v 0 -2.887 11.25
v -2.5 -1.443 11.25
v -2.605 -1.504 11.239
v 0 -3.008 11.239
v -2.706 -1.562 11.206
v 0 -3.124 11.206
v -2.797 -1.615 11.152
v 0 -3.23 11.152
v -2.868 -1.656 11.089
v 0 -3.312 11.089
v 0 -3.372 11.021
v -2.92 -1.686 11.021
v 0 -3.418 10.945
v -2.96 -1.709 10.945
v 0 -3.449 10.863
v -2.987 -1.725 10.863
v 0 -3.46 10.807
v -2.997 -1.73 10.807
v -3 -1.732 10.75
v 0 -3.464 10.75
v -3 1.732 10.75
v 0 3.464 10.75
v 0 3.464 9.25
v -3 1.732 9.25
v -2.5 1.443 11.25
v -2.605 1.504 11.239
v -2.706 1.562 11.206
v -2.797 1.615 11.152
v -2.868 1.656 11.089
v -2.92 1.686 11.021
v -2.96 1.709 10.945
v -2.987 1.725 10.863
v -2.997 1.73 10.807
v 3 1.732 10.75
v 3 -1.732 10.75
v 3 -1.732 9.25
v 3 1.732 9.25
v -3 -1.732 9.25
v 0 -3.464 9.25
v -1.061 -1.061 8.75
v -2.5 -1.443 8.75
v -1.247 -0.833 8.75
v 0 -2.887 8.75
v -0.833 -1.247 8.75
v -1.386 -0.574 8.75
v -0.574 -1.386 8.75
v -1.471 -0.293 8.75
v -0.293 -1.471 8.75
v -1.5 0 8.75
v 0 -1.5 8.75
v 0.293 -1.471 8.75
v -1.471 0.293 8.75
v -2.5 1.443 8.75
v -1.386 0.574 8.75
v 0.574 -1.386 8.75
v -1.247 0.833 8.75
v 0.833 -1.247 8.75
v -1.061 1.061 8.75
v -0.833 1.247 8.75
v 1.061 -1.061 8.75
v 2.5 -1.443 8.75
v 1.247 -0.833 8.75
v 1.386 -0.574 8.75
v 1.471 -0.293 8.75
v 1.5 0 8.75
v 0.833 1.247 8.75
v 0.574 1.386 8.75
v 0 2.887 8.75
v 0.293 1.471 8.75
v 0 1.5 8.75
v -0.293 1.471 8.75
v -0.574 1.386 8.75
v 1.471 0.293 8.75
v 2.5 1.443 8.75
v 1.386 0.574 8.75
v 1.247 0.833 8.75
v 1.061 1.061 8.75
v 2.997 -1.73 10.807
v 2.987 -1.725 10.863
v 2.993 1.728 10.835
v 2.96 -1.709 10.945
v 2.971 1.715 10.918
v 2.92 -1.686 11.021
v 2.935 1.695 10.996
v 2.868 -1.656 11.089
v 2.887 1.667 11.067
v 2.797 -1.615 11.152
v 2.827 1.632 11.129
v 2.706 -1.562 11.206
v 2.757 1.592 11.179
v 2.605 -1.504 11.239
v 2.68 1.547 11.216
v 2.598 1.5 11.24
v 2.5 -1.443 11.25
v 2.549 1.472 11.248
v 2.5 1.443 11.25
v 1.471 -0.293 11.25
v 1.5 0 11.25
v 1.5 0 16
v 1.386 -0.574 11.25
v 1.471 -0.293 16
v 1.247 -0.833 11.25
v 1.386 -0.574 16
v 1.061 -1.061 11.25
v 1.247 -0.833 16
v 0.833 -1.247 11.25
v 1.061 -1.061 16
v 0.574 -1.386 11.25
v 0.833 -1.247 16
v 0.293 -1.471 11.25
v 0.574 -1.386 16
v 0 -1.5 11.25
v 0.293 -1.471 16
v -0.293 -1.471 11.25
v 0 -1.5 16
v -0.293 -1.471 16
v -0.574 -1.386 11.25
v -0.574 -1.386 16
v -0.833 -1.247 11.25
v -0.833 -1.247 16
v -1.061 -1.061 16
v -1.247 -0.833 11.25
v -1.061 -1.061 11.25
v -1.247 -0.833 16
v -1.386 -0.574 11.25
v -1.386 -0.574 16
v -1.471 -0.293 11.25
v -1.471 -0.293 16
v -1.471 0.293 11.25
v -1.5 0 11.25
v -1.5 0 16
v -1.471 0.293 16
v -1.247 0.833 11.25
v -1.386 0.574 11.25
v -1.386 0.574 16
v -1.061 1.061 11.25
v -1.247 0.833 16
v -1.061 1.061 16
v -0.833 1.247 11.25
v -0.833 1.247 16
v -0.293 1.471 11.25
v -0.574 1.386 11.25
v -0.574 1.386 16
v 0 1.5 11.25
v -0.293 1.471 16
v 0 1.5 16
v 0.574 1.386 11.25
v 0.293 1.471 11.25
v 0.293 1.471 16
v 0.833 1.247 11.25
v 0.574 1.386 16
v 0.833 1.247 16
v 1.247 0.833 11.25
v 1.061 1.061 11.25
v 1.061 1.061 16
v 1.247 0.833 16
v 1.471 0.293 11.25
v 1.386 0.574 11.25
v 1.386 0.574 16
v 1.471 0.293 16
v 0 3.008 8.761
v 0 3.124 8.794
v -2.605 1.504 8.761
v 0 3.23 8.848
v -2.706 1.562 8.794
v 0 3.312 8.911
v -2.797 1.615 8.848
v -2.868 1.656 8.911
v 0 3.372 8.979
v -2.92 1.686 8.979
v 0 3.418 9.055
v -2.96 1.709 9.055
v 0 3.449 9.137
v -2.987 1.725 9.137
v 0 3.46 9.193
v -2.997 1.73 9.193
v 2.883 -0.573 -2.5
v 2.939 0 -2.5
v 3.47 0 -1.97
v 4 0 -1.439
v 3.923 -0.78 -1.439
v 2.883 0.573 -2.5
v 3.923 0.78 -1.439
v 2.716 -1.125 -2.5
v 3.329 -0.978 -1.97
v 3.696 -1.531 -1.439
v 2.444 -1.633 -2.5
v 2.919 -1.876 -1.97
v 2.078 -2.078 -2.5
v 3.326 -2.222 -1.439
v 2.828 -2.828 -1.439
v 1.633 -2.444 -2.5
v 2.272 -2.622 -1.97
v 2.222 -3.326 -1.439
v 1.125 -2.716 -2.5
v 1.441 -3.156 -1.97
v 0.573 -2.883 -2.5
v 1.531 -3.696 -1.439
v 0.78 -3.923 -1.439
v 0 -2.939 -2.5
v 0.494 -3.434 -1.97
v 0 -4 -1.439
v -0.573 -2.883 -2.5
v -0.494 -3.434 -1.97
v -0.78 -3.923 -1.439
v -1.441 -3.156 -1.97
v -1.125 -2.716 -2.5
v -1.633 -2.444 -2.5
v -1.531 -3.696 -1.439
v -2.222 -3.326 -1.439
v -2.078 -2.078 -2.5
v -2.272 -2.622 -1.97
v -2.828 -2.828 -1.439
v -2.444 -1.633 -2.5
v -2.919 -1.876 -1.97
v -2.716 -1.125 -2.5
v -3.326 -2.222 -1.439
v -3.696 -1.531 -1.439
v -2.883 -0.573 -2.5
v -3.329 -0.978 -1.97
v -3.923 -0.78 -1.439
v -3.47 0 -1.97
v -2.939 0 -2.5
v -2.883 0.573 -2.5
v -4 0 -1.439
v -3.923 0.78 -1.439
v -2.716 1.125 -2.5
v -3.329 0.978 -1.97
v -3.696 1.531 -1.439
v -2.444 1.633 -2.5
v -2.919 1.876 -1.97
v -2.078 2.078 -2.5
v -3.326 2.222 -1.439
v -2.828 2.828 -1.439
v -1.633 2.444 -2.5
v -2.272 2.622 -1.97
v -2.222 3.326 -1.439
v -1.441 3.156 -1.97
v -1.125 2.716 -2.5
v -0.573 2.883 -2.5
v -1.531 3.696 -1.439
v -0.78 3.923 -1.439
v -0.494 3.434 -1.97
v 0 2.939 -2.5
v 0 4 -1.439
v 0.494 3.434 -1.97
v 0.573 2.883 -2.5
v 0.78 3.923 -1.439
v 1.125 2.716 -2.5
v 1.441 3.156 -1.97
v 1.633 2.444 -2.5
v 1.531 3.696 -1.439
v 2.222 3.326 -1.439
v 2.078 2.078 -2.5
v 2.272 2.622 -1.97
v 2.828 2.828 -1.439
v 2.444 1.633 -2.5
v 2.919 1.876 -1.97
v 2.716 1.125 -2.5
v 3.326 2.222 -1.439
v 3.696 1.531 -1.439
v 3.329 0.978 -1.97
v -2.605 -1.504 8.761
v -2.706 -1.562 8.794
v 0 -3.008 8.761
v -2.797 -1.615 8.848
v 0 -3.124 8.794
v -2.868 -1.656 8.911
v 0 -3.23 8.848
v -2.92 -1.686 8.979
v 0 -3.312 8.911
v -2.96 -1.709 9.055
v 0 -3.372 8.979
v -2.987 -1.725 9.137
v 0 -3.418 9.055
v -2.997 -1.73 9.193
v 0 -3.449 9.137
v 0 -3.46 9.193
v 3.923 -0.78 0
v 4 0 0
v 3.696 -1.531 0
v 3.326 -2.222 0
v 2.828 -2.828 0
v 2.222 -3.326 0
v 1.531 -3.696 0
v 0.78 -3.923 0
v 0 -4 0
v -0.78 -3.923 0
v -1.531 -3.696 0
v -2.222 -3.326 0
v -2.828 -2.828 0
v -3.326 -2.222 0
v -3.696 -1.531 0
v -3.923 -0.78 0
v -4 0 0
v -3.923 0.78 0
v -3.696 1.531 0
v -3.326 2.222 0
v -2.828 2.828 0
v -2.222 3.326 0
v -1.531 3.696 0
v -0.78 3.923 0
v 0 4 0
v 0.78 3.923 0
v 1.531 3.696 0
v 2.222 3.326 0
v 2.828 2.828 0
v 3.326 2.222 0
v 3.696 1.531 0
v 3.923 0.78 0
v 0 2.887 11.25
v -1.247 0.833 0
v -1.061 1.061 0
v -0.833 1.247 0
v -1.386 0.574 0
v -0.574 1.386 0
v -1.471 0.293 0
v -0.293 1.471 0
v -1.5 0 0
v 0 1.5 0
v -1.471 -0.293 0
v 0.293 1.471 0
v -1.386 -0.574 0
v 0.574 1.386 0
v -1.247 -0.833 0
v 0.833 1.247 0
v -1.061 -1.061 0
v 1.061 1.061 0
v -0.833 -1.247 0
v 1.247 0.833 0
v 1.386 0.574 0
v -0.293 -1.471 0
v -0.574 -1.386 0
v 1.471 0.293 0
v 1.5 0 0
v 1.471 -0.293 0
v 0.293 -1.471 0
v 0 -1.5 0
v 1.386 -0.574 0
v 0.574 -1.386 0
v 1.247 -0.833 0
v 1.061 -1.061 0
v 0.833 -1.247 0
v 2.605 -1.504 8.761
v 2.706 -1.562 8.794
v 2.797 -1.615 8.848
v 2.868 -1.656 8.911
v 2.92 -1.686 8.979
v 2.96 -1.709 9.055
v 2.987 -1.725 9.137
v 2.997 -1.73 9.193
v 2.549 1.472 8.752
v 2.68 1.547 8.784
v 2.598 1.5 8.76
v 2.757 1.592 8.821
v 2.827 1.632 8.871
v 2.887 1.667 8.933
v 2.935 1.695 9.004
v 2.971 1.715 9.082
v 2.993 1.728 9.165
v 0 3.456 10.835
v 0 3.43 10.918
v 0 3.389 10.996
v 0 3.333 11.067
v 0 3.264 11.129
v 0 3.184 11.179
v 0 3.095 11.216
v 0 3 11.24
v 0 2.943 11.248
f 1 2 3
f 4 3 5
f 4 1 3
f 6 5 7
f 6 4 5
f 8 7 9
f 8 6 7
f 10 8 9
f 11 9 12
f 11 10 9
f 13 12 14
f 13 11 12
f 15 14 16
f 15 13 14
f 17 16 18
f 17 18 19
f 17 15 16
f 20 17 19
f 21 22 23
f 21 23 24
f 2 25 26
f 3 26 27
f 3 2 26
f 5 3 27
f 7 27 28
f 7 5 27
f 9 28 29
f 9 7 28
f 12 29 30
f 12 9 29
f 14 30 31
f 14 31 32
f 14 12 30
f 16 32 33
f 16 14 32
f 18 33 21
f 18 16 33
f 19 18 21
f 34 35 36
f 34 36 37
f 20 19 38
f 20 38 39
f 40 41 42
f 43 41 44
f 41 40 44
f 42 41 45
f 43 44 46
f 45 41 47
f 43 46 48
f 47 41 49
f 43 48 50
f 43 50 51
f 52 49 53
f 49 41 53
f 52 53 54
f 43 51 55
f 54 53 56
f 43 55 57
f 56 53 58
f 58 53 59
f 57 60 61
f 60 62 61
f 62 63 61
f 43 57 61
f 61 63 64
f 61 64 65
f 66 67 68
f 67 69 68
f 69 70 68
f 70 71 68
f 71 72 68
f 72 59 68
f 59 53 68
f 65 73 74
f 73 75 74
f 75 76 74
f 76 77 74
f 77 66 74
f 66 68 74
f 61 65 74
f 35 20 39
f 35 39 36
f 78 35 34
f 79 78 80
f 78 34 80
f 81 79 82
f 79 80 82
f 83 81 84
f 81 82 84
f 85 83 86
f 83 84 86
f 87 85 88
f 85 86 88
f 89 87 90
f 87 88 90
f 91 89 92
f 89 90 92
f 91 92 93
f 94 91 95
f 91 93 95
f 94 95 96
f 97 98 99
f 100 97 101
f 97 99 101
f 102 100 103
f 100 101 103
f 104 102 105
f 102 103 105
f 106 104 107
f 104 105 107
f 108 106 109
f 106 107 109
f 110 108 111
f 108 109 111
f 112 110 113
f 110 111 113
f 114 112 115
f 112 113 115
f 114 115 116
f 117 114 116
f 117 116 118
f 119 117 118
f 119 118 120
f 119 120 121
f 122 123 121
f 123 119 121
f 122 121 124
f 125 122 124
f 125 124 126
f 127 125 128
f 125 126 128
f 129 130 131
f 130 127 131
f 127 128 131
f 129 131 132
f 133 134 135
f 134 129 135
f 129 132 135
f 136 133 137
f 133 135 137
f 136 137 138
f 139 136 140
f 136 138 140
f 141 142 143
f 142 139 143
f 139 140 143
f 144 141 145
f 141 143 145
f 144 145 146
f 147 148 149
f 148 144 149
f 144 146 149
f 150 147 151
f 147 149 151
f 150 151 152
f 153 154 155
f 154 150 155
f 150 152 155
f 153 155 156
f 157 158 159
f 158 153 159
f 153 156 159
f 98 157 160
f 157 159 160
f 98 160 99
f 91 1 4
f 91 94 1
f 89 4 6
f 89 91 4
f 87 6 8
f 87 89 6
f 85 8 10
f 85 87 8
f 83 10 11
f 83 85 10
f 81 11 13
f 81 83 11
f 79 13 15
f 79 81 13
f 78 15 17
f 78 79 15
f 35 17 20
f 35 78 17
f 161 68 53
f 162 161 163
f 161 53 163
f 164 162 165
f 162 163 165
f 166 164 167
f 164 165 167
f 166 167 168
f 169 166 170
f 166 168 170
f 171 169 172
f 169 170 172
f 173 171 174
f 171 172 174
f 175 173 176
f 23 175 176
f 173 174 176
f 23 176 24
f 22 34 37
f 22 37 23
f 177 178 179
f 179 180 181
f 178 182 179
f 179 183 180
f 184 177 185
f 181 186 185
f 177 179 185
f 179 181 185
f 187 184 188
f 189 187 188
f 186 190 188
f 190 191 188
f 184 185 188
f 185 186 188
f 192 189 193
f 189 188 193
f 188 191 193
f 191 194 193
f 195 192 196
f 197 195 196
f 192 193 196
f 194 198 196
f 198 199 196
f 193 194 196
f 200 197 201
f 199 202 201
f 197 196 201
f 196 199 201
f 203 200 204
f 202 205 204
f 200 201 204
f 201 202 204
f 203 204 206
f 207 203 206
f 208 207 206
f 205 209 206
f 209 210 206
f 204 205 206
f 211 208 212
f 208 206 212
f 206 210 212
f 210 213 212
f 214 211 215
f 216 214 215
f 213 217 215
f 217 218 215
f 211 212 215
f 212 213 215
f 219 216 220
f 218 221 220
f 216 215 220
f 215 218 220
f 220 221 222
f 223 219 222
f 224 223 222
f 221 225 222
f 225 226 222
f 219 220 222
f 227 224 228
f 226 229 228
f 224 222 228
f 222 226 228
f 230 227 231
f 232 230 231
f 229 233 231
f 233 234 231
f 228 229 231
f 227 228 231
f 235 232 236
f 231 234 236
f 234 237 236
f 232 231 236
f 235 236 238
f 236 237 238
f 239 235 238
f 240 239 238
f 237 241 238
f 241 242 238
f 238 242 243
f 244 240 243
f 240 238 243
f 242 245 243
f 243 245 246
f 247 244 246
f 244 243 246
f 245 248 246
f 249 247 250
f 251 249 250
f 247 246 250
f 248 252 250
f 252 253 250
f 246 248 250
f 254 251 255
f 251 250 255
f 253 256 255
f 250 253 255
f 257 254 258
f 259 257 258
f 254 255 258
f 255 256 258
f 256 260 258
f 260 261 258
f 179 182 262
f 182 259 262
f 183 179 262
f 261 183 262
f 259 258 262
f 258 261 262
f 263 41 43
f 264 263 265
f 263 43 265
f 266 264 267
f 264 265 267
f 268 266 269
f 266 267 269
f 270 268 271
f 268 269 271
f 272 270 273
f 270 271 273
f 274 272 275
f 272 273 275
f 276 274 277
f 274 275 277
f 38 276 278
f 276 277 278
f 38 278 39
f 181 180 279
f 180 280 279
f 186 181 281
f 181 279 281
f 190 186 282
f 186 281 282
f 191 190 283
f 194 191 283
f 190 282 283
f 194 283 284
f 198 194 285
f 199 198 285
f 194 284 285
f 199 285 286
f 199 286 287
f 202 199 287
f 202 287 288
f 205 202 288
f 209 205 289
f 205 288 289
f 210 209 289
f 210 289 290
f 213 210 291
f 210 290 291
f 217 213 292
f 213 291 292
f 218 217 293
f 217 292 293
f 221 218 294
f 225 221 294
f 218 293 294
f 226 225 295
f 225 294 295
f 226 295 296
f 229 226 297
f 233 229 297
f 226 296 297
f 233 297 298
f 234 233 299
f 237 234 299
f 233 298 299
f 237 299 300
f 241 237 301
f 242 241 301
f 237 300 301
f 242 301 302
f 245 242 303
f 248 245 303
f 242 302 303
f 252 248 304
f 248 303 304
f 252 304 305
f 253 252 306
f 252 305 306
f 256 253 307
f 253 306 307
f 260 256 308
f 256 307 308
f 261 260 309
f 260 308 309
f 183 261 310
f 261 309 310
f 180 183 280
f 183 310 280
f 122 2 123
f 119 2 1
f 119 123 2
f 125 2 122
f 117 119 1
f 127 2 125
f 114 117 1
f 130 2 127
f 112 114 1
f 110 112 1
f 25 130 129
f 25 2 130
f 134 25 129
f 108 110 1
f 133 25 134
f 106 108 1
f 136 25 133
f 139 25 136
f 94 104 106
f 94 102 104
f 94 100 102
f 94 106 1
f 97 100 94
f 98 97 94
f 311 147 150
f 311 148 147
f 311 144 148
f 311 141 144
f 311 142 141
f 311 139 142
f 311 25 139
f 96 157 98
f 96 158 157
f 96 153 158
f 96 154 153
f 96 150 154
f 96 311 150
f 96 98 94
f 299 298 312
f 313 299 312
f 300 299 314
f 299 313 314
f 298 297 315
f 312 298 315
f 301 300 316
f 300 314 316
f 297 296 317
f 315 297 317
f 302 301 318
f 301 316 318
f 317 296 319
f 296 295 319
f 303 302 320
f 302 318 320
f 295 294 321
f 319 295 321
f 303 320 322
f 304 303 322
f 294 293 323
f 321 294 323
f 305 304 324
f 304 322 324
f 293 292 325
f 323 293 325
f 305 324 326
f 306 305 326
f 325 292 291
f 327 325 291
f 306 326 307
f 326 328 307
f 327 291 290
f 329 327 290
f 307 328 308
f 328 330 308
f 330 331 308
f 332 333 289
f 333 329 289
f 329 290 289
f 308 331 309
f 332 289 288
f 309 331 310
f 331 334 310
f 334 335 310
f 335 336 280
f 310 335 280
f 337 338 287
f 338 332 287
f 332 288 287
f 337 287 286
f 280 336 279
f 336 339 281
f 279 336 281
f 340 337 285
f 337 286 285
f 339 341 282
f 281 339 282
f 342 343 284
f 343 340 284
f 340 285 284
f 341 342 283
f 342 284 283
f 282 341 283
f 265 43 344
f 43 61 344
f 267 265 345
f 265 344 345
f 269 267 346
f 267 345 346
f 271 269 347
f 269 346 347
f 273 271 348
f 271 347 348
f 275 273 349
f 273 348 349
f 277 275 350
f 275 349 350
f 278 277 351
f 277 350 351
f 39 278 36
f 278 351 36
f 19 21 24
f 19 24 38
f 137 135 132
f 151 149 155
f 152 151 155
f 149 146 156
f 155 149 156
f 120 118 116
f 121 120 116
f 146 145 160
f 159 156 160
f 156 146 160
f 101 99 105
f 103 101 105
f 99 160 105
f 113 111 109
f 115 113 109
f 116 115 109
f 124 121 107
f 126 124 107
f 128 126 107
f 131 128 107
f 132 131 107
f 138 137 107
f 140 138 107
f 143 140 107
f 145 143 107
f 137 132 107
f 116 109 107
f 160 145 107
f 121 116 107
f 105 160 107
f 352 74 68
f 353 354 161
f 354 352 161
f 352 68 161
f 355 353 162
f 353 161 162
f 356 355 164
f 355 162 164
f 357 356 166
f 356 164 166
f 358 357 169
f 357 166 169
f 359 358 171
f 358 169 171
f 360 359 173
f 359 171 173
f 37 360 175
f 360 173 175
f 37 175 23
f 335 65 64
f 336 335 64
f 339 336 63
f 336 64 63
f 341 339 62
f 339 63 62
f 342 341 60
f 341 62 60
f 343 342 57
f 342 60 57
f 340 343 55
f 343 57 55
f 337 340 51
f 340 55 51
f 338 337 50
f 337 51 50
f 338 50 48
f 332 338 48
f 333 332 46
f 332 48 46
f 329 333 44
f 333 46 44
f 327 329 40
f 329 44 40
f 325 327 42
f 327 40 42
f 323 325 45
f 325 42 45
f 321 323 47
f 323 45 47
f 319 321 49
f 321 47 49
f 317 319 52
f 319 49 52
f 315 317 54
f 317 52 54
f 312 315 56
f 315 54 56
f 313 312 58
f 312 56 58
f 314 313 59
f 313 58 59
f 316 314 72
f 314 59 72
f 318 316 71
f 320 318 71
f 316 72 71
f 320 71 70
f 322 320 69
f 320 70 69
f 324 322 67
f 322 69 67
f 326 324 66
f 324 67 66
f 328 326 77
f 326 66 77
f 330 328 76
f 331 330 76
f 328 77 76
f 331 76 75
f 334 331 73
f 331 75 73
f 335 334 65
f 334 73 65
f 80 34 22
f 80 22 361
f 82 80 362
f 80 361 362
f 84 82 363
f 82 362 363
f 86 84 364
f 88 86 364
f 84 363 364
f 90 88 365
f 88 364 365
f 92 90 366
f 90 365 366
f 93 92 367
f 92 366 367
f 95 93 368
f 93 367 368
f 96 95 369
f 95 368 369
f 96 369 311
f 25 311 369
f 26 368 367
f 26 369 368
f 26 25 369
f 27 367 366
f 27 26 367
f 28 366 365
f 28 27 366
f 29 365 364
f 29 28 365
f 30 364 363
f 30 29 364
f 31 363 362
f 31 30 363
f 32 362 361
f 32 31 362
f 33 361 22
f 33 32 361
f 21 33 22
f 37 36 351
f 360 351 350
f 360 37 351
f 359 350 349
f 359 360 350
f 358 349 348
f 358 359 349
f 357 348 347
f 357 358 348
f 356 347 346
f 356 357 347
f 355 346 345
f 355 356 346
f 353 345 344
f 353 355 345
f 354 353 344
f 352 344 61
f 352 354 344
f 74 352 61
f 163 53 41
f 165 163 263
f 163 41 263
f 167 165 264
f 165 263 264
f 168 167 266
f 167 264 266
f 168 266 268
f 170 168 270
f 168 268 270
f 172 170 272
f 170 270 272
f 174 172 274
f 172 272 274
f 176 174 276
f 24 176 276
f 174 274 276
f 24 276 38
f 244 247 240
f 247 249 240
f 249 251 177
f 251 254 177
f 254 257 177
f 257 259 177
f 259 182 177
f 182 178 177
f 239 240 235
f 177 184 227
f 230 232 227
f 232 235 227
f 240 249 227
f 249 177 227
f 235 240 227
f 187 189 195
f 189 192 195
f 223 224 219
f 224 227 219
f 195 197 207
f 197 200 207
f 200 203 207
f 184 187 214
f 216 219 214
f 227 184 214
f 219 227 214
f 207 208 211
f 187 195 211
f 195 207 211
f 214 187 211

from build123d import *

# Parameters (mm, degrees)
F4_DEPTH = 1.25
F5_R     = 0.5


with BuildPart() as f1:
    # F0 (on Front) → F1 (revolve)
    with BuildSketch(Plane.XZ):
        Polygon((1.5, 16), (0, 16), (0, -2.5), (2.93934, -2.5), (4, -1.43934), (4, 0), (1.5, 0), align=None)
    revolve(axis=Axis((0, 0, 6.75), (0, 0, -1)))

    # F3 (on offset) → F4 (join, symmetric)
    with BuildSketch(Plane.XY.offset(10)):
        Polygon((3, -1.732051), (3, 1.732051), (0, 3.464102), (-3, 1.732051), (-3, -1.732051), (0, -3.464102), align=None)
    extrude(amount=F4_DEPTH, both=True)

    # F5
    f5_edges = [f1.edges().sort_by_distance(p)[0] for p in [
        (1.5, -2.598076, 11.25),
        (3, 0, 11.25),
        (1.5, 2.598076, 11.25),
        (-1.5, -2.598076, 11.25),
        (-3, 0, 11.25),
        (-1.5, 2.598076, 11.25),
        (-1.5, -2.598076, 8.75),
        (1.5, -2.598076, 8.75),
        (3, 0, 8.75),
        (-3, 0, 8.75),
        (-1.5, 2.598076, 8.75),
        (1.5, 2.598076, 8.75),
    ]]
    fillet(f5_edges, radius=F5_R)


solid = f1.part
